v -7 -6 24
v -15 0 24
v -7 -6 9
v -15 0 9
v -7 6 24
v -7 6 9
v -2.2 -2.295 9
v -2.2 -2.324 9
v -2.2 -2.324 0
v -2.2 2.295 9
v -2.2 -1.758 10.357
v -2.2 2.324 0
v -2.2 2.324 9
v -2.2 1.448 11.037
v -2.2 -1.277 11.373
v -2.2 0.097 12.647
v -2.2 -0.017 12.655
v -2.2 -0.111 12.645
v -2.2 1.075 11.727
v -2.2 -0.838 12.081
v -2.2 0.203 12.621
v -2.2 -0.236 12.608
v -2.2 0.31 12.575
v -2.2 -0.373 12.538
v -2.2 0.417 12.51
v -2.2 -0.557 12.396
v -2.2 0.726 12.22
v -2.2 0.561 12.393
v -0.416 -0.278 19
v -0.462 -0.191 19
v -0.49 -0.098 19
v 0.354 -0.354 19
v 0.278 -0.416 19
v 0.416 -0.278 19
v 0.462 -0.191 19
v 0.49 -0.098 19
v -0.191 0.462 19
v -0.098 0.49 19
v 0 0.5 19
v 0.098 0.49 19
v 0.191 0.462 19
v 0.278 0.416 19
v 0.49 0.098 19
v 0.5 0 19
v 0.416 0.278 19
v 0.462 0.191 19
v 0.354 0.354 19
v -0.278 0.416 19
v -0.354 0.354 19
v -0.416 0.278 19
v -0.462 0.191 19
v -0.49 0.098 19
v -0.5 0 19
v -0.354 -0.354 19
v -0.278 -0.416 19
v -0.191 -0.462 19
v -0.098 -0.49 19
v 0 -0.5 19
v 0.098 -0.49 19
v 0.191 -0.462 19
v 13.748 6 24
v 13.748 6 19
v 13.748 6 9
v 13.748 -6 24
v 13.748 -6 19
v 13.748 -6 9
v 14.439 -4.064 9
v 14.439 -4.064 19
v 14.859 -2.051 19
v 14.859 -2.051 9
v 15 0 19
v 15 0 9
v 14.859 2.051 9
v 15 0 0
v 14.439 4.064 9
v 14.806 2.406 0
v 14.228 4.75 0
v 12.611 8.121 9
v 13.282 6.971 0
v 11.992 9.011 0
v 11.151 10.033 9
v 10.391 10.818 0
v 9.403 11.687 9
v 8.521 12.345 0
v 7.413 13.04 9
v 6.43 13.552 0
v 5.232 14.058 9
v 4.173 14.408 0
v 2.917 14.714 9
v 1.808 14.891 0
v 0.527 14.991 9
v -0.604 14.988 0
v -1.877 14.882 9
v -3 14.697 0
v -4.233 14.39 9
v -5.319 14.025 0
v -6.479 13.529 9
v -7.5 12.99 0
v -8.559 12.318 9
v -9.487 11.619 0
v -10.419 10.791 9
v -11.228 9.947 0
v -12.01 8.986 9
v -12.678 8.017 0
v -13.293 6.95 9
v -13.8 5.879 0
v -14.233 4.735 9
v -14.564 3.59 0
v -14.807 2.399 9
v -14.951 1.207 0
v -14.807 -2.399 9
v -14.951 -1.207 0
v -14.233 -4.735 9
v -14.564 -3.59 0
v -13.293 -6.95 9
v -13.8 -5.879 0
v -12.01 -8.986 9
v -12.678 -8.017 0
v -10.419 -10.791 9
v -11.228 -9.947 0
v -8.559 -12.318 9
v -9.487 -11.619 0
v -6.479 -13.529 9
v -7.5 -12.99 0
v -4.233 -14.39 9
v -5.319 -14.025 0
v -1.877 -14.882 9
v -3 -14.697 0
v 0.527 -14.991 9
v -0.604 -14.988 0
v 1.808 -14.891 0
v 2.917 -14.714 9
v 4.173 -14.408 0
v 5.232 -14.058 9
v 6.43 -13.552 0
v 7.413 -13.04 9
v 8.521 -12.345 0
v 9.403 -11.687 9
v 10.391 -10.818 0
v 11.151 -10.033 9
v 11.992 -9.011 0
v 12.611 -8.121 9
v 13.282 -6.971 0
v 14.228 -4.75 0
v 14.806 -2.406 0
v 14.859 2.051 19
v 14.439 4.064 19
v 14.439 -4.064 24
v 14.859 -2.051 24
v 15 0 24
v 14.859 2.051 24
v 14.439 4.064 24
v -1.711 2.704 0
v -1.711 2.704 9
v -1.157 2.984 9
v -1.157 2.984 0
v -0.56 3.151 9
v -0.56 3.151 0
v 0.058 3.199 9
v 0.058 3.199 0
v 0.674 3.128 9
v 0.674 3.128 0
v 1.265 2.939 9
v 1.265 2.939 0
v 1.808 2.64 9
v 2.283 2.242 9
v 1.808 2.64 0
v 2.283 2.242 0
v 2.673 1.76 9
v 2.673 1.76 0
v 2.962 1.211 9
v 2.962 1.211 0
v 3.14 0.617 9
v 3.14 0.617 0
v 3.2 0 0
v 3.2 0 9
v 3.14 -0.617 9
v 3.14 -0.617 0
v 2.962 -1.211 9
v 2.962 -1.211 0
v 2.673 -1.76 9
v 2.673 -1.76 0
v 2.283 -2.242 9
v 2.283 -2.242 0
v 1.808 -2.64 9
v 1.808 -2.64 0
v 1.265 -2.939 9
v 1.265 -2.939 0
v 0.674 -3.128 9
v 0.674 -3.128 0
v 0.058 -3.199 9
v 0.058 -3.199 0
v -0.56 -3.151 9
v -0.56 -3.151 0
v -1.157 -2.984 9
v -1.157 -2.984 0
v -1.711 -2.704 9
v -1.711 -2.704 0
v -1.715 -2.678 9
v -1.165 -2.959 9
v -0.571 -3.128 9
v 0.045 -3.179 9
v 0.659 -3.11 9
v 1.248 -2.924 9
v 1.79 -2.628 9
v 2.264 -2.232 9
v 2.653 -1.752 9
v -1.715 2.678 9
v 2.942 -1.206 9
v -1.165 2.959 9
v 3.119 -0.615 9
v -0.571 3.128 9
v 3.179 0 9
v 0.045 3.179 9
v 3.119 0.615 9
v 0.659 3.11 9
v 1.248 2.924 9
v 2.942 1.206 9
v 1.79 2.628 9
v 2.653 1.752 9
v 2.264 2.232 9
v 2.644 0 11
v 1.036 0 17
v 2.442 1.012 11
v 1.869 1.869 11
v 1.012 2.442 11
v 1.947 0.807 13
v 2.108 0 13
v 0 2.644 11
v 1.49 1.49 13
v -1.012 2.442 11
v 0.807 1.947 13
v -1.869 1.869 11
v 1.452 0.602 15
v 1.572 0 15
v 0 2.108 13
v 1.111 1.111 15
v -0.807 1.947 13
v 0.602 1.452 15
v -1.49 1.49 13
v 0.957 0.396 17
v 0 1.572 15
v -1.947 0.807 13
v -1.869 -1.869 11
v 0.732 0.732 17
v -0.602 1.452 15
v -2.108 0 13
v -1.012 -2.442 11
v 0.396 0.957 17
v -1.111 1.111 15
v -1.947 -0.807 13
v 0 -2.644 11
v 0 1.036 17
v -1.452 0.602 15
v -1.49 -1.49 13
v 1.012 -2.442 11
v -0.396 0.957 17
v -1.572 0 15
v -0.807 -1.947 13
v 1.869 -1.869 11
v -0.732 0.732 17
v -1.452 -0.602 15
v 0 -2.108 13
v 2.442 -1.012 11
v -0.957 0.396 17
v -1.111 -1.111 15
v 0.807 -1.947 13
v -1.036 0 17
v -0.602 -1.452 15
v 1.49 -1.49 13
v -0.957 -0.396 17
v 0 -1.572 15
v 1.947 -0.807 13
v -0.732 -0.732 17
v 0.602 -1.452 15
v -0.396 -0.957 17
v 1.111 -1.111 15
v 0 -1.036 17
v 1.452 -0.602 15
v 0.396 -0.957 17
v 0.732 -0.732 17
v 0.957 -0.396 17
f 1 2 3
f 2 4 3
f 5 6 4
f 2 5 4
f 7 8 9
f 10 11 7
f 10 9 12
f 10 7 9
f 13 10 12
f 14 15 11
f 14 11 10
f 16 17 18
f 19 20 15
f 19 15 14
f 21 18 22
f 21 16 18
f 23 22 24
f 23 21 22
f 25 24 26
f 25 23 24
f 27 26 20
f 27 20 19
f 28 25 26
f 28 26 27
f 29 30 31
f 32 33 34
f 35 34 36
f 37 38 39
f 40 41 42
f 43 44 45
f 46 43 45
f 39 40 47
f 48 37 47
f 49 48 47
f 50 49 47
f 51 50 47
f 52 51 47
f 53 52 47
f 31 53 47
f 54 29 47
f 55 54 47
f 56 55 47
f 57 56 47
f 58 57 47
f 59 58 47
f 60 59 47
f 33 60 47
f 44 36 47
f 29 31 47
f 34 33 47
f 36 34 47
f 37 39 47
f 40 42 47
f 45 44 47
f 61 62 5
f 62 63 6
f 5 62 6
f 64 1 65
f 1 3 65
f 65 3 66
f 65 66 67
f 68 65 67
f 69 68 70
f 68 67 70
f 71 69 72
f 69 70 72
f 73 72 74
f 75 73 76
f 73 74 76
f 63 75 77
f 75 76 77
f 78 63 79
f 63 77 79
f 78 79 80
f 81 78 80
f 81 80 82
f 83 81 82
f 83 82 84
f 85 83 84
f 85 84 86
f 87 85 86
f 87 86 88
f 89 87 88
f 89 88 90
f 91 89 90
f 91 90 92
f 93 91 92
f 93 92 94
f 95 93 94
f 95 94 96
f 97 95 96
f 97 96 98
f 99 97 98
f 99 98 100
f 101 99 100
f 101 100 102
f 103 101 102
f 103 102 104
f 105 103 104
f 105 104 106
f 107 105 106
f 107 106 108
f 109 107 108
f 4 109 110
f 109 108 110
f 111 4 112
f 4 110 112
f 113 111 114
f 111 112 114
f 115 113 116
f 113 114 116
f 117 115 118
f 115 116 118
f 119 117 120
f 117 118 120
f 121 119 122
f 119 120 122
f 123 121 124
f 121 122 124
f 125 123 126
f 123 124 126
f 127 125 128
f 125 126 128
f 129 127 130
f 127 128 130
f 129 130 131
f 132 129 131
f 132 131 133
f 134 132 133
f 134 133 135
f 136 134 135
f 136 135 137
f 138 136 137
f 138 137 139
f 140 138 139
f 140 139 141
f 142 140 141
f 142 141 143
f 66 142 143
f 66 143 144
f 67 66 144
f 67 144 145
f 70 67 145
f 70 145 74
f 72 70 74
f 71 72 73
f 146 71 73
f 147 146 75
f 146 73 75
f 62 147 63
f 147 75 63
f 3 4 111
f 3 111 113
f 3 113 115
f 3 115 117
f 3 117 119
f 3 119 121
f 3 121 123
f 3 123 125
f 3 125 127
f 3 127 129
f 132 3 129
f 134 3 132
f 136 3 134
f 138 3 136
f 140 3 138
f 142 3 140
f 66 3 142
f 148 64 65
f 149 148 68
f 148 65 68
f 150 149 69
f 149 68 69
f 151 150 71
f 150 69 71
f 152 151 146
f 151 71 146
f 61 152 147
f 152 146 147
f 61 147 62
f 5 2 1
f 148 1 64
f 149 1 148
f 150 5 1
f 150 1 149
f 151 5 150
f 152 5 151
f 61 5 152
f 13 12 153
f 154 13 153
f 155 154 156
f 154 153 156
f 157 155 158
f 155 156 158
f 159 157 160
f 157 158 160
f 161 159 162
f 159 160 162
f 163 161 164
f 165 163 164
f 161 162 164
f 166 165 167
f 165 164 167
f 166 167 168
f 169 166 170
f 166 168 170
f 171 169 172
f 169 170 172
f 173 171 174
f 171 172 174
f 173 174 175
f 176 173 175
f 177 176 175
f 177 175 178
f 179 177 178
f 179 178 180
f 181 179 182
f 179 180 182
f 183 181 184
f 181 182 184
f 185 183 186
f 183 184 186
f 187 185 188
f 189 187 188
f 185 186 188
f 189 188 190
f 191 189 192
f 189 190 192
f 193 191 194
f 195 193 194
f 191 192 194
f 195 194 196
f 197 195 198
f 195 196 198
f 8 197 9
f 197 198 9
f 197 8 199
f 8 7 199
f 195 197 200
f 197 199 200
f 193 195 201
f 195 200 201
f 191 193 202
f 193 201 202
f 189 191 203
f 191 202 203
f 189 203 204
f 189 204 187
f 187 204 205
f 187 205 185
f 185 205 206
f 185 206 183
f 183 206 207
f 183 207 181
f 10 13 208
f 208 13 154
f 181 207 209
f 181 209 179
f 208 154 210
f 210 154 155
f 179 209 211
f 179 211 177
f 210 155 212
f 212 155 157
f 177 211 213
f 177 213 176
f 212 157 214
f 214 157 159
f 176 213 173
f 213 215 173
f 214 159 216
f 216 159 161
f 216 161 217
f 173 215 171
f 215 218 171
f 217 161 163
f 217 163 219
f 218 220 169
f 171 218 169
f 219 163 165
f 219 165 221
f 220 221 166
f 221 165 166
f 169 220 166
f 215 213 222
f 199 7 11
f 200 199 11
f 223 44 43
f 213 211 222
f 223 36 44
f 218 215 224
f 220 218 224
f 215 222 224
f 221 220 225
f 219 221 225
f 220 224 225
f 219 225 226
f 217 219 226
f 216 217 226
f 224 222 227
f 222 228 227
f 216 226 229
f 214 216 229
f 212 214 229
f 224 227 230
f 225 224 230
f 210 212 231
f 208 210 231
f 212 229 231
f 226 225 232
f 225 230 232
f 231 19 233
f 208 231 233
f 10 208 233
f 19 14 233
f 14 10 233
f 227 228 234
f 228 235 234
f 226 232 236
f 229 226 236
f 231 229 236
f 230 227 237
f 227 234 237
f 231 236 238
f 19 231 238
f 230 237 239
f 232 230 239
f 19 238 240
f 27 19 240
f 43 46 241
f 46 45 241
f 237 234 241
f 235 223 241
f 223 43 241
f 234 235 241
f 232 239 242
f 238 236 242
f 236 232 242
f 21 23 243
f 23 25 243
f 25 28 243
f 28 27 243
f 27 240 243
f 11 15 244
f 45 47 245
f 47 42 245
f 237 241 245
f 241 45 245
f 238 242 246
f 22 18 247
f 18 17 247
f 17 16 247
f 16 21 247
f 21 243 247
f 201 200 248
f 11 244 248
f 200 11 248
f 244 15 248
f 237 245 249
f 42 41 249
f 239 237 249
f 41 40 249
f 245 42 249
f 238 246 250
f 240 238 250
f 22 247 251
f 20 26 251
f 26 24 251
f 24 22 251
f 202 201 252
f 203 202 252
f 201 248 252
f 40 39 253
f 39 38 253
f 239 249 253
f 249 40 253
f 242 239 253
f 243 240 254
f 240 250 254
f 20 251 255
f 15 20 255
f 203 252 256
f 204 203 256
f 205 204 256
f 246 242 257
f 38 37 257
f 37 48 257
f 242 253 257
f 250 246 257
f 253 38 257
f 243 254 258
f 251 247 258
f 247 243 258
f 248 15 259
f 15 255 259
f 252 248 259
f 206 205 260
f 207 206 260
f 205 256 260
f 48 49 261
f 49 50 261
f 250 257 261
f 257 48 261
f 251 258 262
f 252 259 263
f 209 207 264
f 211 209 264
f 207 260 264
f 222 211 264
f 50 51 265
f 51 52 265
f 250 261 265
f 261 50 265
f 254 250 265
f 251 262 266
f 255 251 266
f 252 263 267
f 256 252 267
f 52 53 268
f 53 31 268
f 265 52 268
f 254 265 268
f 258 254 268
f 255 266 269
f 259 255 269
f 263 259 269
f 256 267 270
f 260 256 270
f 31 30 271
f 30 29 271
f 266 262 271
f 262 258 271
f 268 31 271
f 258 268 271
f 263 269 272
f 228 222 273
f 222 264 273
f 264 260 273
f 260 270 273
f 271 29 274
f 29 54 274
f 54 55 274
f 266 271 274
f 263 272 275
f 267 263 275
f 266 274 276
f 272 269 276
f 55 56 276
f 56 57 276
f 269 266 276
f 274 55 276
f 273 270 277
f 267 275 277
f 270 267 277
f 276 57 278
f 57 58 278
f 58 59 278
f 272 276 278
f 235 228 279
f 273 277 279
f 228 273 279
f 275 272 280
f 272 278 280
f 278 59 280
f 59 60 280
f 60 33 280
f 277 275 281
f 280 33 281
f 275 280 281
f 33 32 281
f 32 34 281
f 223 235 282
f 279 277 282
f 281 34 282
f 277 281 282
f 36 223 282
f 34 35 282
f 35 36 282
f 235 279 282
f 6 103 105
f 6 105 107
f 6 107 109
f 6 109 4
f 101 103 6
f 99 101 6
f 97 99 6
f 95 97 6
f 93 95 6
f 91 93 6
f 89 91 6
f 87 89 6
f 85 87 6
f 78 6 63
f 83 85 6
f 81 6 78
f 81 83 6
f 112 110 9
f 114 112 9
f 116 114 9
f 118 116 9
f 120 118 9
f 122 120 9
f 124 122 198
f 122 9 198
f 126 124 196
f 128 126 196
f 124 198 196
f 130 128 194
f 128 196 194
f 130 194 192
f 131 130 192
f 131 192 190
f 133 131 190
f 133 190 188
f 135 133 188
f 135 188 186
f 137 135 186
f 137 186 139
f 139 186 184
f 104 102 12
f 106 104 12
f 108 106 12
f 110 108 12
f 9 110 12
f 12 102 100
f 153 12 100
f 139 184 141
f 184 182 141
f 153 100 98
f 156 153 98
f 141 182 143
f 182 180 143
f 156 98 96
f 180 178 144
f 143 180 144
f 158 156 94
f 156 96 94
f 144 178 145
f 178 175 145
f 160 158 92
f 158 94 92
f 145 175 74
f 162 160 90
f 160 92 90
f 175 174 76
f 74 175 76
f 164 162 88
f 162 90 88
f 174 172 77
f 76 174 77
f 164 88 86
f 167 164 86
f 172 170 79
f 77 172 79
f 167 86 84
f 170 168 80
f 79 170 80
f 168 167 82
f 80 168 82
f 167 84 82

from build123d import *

# Parameters (mm, degrees)
F0_R     = 15
F1_DEPTH = 9
F2_R     = 0.5
F3_DEPTH = 10
F6_DEPTH = 5


# Not quite as in the source:
# - a fillet or chamfer that OpenCascade refuses, or shapes differently, is made with other operations: its cross-section is extruded or revolved along the edge and cut away or added


with BuildPart() as f1:
    # F0 (on Top) → F1 (new body)
    with BuildSketch(Plane.XY):
        Circle(F0_R)
        with BuildLine():
            Line((-2.2, -2.3237900077), (-2.2, 2.3237900077))
            ThreePointArc((-2.2, 2.3237900077), (3.2, 0), (-2.2, -2.3237900077))
        make_face(mode=Mode.SUBTRACT)
    extrude(amount=F1_DEPTH)

    # F2 (on face) → F3 (join)
    with BuildSketch(Plane.XY.offset(9)):
        with BuildLine():
            Line((-7, 6), (-15, 0))
            Line((-15, 0), (-7, -6))
            Line((-7, -6), (13.7477270849, -6))
            ThreePointArc((13.7477270849, -6), (14.683594694, -3.0646446553), (15, 0))
            ThreePointArc((15, 0), (14.683594694, 3.0646446553), (13.7477270849, 6))
            Line((13.7477270849, 6), (-7, 6))
        make_face()
        Circle(F2_R, mode=Mode.SUBTRACT)
    extrude(amount=F3_DEPTH)

    # F4: chamfer of 10 x 2.6794919243 on 1 edges, made by hand


with BuildPart() as f4_tool2:
    # F4_s3 → F4_t4 (revolve)
    with BuildSketch(Plane.XZ):
        Polygon((3.1794919243, 9), (0.5, 19), (0.5, 9), align=None)
    revolve(axis=Axis((0, 0, 9), (0, 0, 1)))

    split(bisect_by=Plane.YZ.offset(-2.2), keep=Keep.TOP)


with BuildPart() as f1_1:
    add(f1.part)

    # F4_t1: cut F4_tool2
    add(f4_tool2.part, mode=Mode.SUBTRACT)

    # F5 (on face) → F6 (join)
    with BuildSketch(Plane.XY.offset(19)):
        with BuildLine():
            Line((-7, 6), (-15, 0))
            Line((-15, 0), (-7, -6))
            Line((-7, -6), (13.7477270849, -6))
            ThreePointArc((13.7477270849, -6), (15, 0), (13.7477270849, 6))
            Line((13.7477270849, 6), (-7, 6))
        make_face()
    extrude(amount=F6_DEPTH)


solid = f1_1.part
